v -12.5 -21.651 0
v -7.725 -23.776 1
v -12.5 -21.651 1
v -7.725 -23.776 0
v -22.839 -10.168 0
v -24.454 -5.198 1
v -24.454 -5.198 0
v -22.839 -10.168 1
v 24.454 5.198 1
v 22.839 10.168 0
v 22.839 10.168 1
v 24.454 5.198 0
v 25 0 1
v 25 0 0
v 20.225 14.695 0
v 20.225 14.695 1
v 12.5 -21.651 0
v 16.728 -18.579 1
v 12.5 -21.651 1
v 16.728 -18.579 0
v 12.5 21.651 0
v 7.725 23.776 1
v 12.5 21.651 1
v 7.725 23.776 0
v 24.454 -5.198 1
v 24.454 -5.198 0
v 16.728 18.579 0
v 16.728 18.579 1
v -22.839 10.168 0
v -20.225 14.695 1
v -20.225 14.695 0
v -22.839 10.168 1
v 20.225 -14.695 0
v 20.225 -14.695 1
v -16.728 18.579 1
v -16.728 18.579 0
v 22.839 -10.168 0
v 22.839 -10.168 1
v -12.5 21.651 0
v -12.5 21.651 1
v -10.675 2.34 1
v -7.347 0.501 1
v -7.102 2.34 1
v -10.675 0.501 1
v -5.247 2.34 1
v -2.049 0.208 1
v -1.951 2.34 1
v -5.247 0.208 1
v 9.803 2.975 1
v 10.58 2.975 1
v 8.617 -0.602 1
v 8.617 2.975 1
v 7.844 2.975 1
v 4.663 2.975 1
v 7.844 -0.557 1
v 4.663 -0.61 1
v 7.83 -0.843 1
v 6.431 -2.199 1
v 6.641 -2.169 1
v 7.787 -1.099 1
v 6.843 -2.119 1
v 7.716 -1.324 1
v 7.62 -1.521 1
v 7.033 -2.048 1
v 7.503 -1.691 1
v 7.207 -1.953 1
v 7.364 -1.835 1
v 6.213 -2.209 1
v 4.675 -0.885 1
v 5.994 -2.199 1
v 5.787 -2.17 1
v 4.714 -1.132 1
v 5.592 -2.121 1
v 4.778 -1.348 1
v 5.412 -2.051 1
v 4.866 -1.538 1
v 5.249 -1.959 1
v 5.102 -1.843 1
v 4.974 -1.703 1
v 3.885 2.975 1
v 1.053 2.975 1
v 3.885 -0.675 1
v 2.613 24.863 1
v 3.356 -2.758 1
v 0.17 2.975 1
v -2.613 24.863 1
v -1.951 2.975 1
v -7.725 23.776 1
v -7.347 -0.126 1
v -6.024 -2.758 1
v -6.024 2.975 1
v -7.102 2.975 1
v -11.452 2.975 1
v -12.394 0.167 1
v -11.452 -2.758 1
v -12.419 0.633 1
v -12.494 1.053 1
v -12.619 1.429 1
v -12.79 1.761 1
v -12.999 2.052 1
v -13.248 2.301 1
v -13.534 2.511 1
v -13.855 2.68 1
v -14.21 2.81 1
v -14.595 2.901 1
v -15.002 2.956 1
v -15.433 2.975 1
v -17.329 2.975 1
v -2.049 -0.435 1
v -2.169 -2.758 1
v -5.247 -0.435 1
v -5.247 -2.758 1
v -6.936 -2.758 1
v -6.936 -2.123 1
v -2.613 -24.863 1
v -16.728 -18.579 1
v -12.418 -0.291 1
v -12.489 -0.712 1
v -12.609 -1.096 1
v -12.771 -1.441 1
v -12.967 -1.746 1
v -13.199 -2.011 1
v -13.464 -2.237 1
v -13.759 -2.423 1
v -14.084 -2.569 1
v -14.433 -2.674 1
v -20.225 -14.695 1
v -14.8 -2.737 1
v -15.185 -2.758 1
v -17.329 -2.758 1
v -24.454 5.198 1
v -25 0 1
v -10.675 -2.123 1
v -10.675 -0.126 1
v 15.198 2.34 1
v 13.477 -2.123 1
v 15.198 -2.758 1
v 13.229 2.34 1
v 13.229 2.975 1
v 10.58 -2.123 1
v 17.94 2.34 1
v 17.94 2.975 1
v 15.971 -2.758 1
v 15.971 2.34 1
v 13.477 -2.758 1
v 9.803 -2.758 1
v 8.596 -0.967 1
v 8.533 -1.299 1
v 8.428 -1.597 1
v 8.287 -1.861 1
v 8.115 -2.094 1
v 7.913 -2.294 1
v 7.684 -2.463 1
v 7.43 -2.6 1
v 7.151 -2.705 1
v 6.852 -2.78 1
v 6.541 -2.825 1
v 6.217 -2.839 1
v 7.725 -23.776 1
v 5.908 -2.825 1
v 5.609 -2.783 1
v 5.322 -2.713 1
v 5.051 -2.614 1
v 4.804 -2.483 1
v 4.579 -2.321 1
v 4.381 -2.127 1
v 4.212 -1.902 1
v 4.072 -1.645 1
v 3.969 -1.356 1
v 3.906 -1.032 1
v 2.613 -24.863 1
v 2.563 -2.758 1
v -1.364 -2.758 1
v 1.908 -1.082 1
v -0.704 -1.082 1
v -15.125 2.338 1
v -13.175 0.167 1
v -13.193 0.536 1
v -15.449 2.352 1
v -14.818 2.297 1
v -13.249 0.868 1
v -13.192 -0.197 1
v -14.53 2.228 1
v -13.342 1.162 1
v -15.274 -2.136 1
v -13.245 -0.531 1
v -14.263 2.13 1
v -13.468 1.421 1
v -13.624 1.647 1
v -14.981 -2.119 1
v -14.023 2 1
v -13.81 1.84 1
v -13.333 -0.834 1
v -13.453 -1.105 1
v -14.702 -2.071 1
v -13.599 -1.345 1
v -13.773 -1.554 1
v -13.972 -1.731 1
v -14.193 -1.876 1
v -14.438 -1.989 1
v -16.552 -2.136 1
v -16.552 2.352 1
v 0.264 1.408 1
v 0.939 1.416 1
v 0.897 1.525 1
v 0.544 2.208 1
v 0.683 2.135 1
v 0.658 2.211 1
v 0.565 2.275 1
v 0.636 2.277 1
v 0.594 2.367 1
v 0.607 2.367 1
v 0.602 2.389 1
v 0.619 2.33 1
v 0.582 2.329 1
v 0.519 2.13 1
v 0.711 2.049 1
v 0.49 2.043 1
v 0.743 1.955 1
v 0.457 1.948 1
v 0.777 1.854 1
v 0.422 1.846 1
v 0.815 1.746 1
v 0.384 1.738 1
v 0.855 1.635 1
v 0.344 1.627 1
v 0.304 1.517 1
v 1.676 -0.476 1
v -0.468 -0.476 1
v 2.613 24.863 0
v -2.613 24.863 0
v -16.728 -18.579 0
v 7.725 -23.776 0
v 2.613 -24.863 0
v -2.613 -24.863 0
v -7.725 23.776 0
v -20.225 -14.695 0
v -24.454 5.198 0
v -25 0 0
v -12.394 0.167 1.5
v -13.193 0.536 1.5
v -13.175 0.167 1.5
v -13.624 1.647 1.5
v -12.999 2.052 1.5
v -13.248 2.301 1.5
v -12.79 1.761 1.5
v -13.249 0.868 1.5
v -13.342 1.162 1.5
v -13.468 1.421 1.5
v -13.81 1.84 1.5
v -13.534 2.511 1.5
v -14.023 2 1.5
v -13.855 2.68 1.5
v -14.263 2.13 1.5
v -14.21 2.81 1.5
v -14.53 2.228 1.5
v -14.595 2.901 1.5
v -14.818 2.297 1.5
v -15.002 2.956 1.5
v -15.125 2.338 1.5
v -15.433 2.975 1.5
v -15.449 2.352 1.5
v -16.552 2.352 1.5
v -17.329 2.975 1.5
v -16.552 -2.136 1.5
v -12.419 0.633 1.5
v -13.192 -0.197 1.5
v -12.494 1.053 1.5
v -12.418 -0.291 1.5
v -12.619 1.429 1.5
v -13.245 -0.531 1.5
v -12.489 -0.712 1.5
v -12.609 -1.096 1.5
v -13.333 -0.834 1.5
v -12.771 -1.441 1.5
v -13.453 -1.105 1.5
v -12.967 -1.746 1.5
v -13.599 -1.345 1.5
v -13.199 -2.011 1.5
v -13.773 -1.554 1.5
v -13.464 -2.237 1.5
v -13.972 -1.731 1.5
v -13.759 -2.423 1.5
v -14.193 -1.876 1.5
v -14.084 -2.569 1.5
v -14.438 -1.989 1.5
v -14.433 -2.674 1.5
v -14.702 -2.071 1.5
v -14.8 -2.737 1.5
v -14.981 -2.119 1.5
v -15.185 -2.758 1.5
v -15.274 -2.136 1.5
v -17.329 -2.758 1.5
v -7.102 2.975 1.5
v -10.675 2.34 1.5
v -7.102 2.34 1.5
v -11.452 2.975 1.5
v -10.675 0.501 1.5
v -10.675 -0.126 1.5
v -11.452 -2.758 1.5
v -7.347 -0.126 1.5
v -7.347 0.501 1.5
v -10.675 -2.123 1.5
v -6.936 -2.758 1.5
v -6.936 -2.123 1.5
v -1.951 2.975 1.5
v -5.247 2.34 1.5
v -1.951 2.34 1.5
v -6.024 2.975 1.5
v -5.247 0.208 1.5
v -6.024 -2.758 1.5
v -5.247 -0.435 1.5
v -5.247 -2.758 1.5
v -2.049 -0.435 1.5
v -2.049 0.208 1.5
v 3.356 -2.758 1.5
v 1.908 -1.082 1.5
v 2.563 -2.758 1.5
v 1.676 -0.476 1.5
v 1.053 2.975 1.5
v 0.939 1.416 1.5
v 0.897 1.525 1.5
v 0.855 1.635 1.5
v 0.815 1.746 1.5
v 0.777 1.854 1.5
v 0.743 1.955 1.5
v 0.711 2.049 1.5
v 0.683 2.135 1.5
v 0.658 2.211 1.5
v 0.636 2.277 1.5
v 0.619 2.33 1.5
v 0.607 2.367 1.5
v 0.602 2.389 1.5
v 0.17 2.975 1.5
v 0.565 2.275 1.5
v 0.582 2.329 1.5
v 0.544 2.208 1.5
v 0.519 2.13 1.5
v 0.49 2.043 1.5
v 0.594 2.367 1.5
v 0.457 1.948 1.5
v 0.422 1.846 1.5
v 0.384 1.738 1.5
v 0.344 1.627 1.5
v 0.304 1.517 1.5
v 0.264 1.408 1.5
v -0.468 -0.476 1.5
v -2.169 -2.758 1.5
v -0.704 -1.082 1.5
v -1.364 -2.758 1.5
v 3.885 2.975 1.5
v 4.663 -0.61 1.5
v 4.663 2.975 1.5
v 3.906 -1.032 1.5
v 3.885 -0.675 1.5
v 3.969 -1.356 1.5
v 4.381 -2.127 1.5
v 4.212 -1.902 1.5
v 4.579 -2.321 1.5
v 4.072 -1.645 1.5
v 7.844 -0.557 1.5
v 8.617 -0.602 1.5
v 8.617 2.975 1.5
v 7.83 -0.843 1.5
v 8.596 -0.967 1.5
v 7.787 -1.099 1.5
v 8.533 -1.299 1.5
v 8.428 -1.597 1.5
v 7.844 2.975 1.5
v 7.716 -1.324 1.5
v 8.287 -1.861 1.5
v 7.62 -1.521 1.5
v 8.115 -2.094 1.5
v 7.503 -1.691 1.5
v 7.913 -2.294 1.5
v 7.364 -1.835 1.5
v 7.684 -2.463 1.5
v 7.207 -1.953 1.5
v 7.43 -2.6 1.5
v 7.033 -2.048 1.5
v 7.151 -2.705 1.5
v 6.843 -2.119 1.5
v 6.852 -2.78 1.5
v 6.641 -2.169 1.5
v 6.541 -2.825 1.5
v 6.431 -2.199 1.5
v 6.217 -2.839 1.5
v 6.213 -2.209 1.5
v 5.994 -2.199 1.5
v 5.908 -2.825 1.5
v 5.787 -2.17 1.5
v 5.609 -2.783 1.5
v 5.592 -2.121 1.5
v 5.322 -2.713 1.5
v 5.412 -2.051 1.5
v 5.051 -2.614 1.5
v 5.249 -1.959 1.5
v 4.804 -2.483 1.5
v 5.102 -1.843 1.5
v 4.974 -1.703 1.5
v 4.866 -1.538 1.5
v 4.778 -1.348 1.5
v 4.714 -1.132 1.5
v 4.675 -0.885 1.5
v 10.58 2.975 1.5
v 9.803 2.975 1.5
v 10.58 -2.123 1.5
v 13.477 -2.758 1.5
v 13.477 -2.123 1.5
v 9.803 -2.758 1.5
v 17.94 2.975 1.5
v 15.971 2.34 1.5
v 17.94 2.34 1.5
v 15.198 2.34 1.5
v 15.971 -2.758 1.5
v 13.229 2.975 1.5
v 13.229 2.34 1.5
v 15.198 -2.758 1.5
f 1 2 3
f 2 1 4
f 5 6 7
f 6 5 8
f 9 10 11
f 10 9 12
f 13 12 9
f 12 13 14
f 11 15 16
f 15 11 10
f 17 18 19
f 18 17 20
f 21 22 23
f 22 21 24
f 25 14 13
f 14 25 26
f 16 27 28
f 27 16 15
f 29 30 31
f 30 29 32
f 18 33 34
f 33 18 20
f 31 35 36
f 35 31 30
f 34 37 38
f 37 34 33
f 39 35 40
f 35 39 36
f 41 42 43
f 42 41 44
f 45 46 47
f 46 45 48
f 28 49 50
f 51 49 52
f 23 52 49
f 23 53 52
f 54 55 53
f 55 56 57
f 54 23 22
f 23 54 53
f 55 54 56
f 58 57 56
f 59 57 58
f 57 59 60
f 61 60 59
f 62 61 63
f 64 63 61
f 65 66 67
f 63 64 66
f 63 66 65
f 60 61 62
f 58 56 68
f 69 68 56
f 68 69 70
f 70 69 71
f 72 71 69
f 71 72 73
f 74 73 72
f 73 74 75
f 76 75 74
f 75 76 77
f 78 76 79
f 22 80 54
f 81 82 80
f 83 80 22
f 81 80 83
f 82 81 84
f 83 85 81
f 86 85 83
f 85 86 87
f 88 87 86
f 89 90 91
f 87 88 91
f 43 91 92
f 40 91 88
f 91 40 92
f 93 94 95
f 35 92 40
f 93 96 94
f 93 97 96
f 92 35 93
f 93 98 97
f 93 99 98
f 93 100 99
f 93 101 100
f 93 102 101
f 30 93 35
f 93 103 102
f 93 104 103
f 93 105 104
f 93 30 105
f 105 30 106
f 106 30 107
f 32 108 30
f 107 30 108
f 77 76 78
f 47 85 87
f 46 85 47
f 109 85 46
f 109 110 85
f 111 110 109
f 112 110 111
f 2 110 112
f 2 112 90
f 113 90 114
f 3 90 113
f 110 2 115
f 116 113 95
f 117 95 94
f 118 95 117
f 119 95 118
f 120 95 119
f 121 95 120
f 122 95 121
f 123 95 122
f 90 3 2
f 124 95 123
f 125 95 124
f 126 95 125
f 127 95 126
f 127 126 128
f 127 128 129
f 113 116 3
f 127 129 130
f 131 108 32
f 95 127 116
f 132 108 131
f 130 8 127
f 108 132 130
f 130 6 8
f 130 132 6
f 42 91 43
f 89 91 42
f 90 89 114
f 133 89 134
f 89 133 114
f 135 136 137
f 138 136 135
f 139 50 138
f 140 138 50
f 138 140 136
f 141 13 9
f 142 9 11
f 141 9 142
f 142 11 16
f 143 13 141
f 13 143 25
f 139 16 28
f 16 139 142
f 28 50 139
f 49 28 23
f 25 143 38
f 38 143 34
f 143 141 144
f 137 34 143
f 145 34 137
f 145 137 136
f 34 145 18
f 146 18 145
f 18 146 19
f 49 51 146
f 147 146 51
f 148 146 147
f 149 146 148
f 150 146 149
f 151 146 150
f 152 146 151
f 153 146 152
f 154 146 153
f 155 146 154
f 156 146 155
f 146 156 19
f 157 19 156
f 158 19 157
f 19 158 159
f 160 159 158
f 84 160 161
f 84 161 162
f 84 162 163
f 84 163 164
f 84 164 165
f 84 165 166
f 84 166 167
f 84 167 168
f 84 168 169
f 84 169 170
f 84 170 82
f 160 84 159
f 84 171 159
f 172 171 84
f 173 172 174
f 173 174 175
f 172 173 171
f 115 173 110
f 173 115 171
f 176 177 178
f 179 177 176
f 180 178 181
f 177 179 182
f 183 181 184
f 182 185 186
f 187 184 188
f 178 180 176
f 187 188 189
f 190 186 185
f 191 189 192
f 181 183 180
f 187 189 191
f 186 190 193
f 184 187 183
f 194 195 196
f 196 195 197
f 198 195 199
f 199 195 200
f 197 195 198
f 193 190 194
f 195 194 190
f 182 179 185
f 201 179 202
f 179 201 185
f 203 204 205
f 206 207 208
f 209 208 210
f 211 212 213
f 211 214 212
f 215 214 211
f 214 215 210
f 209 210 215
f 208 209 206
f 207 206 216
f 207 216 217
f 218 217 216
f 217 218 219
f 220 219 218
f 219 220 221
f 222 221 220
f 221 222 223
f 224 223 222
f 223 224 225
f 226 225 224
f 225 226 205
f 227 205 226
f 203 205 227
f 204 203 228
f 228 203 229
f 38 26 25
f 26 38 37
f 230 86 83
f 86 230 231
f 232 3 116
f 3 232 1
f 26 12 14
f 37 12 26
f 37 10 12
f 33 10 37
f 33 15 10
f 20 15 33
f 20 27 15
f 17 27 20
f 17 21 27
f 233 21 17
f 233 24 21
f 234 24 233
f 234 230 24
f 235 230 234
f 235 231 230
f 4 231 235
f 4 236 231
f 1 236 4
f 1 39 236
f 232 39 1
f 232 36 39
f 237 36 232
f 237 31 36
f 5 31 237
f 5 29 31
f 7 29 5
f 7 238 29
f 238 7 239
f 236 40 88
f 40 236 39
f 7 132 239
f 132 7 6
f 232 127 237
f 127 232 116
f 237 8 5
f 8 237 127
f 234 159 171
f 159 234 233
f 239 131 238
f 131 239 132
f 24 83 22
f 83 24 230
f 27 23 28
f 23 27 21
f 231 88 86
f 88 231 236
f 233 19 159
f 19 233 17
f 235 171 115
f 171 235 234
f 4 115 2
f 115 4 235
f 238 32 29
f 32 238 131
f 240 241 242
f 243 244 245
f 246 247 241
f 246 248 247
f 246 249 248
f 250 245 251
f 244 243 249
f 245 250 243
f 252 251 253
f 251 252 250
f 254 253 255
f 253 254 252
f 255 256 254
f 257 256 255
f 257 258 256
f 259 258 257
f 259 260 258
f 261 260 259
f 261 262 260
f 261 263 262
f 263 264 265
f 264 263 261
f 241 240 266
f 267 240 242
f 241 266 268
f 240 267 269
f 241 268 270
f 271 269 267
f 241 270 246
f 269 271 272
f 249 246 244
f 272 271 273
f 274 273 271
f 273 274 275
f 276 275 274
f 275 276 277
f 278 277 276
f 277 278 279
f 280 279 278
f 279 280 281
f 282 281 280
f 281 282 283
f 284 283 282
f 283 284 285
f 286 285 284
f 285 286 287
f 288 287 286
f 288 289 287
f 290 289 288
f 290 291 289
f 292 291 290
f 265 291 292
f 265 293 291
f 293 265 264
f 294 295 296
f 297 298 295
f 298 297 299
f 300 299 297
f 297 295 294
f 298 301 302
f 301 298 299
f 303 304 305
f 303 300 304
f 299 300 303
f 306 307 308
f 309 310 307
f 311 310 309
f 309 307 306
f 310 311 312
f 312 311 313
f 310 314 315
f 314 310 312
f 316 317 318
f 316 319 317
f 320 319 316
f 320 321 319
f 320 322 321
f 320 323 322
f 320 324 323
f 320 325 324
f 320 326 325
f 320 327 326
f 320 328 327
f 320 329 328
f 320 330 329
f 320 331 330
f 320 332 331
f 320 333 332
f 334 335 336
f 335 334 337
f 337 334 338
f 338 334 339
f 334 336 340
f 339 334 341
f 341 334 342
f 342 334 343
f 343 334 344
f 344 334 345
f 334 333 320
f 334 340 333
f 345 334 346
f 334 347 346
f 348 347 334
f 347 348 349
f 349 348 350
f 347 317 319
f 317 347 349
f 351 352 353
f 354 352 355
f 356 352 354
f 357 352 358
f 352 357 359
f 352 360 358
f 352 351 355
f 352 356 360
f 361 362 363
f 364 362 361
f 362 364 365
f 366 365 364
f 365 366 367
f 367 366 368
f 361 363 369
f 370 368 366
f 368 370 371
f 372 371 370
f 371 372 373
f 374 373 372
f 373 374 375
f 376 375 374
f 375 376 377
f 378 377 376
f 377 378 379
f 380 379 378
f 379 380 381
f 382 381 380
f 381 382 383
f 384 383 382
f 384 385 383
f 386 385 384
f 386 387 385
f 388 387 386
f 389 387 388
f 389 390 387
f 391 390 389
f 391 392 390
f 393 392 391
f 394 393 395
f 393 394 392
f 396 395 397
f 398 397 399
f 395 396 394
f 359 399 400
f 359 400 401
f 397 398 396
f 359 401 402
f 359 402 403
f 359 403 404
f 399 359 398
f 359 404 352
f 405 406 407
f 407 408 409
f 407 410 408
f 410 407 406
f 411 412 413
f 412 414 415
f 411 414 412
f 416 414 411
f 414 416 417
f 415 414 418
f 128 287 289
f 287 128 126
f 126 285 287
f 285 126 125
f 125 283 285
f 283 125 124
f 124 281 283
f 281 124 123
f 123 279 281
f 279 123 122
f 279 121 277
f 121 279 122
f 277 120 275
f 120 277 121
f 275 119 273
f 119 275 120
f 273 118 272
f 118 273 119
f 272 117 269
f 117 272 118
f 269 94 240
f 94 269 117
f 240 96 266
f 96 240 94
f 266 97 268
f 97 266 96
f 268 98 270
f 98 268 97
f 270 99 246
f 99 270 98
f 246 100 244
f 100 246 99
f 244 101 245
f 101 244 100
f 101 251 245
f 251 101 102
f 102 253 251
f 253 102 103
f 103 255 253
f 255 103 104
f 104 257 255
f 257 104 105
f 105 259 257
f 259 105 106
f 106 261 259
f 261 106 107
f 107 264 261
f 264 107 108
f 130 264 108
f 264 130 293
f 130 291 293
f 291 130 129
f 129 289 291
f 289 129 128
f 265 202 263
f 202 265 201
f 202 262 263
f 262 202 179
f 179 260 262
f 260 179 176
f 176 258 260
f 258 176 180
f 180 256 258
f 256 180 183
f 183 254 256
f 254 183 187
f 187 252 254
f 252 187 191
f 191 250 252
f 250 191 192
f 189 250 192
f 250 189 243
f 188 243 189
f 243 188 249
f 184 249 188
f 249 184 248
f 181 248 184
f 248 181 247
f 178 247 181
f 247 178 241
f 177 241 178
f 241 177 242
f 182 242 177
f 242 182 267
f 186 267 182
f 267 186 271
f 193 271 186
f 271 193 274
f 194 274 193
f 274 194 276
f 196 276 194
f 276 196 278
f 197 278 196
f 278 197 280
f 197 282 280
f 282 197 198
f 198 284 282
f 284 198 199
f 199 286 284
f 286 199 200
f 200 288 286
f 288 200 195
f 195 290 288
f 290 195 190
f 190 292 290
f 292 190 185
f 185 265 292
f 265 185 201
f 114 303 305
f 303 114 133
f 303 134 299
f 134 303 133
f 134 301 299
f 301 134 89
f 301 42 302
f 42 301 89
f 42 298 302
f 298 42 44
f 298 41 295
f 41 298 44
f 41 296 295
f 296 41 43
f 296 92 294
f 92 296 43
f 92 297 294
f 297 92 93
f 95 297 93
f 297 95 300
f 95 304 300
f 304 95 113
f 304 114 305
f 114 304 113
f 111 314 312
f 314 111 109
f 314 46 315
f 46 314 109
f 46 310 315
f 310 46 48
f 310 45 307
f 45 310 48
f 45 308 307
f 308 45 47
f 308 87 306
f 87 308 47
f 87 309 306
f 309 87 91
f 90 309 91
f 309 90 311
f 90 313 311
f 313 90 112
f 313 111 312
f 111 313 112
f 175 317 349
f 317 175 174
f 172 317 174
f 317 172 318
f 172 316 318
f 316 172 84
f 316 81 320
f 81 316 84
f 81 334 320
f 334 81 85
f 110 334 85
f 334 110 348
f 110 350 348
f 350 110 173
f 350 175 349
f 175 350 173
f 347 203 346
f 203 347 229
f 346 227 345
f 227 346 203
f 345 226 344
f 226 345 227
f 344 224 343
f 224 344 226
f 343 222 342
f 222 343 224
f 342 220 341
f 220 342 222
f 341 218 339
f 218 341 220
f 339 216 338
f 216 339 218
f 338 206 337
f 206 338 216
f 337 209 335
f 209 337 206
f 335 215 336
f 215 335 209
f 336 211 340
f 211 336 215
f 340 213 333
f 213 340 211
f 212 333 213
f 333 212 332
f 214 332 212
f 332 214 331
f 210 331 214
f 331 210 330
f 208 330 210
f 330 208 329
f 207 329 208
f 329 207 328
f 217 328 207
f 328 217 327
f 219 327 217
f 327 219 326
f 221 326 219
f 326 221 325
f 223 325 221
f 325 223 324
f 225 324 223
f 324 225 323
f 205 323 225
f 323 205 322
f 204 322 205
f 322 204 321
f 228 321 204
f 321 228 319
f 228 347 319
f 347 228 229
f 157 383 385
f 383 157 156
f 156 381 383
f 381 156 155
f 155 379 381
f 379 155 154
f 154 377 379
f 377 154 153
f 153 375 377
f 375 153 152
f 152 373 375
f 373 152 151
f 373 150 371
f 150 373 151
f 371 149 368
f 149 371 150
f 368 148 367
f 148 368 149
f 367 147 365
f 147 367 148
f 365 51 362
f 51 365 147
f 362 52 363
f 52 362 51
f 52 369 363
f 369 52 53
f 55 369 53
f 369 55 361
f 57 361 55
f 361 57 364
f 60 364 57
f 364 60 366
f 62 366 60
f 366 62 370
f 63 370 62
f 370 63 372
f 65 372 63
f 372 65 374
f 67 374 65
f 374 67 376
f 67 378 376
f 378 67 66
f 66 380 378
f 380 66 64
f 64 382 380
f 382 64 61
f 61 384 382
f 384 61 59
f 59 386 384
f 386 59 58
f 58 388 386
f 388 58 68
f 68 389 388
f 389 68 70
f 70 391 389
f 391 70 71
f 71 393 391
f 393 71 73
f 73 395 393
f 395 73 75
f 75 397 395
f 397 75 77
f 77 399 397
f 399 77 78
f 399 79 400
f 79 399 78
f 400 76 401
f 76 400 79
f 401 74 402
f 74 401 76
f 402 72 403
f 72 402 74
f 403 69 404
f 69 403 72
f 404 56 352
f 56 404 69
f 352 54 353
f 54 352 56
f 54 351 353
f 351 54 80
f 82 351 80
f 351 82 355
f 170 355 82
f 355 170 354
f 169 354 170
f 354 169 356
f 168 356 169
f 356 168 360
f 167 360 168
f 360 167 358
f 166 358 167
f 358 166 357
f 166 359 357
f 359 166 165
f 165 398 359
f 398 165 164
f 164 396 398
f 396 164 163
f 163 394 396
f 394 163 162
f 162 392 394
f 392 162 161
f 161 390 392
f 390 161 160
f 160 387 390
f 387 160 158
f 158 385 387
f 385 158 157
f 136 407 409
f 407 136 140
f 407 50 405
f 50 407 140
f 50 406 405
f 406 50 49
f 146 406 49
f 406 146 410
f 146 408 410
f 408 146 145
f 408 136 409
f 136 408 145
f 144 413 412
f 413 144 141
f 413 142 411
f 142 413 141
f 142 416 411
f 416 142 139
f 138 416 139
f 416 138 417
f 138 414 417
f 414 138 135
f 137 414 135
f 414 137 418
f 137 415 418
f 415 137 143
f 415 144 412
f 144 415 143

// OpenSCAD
// file: _OSBSlib.scad
osbs_selected_extruder = 0;
function osbs_extruder(extruder_number) = osbs_selected_extruder == undef || osbs_selected_extruder == 0 ? true : osbs_selected_extruder == extruder_number;
// main file
// The following line is requied for file to be included in OSBS build
/* OSBS:build:2E */

// Include  OSBS library so we can use the osbs_extruder() function
use <_OSBSlib.scad>;

// Set the default values of variables; they may be changed later by OSBS
text = "DEFAULT";
diameter = 50;
thickness = 1;

if(osbs_extruder(1)) color("RoyalBlue") {
    cylinder(d = diameter, h = thickness);
}

if(osbs_extruder(2)) color("Firebrick") {
    translate([0, 0, thickness]) 
        linear_extrude(thickness / 2) 
            text(text = text, size = 6, halign = "center", valign = "center");
}
